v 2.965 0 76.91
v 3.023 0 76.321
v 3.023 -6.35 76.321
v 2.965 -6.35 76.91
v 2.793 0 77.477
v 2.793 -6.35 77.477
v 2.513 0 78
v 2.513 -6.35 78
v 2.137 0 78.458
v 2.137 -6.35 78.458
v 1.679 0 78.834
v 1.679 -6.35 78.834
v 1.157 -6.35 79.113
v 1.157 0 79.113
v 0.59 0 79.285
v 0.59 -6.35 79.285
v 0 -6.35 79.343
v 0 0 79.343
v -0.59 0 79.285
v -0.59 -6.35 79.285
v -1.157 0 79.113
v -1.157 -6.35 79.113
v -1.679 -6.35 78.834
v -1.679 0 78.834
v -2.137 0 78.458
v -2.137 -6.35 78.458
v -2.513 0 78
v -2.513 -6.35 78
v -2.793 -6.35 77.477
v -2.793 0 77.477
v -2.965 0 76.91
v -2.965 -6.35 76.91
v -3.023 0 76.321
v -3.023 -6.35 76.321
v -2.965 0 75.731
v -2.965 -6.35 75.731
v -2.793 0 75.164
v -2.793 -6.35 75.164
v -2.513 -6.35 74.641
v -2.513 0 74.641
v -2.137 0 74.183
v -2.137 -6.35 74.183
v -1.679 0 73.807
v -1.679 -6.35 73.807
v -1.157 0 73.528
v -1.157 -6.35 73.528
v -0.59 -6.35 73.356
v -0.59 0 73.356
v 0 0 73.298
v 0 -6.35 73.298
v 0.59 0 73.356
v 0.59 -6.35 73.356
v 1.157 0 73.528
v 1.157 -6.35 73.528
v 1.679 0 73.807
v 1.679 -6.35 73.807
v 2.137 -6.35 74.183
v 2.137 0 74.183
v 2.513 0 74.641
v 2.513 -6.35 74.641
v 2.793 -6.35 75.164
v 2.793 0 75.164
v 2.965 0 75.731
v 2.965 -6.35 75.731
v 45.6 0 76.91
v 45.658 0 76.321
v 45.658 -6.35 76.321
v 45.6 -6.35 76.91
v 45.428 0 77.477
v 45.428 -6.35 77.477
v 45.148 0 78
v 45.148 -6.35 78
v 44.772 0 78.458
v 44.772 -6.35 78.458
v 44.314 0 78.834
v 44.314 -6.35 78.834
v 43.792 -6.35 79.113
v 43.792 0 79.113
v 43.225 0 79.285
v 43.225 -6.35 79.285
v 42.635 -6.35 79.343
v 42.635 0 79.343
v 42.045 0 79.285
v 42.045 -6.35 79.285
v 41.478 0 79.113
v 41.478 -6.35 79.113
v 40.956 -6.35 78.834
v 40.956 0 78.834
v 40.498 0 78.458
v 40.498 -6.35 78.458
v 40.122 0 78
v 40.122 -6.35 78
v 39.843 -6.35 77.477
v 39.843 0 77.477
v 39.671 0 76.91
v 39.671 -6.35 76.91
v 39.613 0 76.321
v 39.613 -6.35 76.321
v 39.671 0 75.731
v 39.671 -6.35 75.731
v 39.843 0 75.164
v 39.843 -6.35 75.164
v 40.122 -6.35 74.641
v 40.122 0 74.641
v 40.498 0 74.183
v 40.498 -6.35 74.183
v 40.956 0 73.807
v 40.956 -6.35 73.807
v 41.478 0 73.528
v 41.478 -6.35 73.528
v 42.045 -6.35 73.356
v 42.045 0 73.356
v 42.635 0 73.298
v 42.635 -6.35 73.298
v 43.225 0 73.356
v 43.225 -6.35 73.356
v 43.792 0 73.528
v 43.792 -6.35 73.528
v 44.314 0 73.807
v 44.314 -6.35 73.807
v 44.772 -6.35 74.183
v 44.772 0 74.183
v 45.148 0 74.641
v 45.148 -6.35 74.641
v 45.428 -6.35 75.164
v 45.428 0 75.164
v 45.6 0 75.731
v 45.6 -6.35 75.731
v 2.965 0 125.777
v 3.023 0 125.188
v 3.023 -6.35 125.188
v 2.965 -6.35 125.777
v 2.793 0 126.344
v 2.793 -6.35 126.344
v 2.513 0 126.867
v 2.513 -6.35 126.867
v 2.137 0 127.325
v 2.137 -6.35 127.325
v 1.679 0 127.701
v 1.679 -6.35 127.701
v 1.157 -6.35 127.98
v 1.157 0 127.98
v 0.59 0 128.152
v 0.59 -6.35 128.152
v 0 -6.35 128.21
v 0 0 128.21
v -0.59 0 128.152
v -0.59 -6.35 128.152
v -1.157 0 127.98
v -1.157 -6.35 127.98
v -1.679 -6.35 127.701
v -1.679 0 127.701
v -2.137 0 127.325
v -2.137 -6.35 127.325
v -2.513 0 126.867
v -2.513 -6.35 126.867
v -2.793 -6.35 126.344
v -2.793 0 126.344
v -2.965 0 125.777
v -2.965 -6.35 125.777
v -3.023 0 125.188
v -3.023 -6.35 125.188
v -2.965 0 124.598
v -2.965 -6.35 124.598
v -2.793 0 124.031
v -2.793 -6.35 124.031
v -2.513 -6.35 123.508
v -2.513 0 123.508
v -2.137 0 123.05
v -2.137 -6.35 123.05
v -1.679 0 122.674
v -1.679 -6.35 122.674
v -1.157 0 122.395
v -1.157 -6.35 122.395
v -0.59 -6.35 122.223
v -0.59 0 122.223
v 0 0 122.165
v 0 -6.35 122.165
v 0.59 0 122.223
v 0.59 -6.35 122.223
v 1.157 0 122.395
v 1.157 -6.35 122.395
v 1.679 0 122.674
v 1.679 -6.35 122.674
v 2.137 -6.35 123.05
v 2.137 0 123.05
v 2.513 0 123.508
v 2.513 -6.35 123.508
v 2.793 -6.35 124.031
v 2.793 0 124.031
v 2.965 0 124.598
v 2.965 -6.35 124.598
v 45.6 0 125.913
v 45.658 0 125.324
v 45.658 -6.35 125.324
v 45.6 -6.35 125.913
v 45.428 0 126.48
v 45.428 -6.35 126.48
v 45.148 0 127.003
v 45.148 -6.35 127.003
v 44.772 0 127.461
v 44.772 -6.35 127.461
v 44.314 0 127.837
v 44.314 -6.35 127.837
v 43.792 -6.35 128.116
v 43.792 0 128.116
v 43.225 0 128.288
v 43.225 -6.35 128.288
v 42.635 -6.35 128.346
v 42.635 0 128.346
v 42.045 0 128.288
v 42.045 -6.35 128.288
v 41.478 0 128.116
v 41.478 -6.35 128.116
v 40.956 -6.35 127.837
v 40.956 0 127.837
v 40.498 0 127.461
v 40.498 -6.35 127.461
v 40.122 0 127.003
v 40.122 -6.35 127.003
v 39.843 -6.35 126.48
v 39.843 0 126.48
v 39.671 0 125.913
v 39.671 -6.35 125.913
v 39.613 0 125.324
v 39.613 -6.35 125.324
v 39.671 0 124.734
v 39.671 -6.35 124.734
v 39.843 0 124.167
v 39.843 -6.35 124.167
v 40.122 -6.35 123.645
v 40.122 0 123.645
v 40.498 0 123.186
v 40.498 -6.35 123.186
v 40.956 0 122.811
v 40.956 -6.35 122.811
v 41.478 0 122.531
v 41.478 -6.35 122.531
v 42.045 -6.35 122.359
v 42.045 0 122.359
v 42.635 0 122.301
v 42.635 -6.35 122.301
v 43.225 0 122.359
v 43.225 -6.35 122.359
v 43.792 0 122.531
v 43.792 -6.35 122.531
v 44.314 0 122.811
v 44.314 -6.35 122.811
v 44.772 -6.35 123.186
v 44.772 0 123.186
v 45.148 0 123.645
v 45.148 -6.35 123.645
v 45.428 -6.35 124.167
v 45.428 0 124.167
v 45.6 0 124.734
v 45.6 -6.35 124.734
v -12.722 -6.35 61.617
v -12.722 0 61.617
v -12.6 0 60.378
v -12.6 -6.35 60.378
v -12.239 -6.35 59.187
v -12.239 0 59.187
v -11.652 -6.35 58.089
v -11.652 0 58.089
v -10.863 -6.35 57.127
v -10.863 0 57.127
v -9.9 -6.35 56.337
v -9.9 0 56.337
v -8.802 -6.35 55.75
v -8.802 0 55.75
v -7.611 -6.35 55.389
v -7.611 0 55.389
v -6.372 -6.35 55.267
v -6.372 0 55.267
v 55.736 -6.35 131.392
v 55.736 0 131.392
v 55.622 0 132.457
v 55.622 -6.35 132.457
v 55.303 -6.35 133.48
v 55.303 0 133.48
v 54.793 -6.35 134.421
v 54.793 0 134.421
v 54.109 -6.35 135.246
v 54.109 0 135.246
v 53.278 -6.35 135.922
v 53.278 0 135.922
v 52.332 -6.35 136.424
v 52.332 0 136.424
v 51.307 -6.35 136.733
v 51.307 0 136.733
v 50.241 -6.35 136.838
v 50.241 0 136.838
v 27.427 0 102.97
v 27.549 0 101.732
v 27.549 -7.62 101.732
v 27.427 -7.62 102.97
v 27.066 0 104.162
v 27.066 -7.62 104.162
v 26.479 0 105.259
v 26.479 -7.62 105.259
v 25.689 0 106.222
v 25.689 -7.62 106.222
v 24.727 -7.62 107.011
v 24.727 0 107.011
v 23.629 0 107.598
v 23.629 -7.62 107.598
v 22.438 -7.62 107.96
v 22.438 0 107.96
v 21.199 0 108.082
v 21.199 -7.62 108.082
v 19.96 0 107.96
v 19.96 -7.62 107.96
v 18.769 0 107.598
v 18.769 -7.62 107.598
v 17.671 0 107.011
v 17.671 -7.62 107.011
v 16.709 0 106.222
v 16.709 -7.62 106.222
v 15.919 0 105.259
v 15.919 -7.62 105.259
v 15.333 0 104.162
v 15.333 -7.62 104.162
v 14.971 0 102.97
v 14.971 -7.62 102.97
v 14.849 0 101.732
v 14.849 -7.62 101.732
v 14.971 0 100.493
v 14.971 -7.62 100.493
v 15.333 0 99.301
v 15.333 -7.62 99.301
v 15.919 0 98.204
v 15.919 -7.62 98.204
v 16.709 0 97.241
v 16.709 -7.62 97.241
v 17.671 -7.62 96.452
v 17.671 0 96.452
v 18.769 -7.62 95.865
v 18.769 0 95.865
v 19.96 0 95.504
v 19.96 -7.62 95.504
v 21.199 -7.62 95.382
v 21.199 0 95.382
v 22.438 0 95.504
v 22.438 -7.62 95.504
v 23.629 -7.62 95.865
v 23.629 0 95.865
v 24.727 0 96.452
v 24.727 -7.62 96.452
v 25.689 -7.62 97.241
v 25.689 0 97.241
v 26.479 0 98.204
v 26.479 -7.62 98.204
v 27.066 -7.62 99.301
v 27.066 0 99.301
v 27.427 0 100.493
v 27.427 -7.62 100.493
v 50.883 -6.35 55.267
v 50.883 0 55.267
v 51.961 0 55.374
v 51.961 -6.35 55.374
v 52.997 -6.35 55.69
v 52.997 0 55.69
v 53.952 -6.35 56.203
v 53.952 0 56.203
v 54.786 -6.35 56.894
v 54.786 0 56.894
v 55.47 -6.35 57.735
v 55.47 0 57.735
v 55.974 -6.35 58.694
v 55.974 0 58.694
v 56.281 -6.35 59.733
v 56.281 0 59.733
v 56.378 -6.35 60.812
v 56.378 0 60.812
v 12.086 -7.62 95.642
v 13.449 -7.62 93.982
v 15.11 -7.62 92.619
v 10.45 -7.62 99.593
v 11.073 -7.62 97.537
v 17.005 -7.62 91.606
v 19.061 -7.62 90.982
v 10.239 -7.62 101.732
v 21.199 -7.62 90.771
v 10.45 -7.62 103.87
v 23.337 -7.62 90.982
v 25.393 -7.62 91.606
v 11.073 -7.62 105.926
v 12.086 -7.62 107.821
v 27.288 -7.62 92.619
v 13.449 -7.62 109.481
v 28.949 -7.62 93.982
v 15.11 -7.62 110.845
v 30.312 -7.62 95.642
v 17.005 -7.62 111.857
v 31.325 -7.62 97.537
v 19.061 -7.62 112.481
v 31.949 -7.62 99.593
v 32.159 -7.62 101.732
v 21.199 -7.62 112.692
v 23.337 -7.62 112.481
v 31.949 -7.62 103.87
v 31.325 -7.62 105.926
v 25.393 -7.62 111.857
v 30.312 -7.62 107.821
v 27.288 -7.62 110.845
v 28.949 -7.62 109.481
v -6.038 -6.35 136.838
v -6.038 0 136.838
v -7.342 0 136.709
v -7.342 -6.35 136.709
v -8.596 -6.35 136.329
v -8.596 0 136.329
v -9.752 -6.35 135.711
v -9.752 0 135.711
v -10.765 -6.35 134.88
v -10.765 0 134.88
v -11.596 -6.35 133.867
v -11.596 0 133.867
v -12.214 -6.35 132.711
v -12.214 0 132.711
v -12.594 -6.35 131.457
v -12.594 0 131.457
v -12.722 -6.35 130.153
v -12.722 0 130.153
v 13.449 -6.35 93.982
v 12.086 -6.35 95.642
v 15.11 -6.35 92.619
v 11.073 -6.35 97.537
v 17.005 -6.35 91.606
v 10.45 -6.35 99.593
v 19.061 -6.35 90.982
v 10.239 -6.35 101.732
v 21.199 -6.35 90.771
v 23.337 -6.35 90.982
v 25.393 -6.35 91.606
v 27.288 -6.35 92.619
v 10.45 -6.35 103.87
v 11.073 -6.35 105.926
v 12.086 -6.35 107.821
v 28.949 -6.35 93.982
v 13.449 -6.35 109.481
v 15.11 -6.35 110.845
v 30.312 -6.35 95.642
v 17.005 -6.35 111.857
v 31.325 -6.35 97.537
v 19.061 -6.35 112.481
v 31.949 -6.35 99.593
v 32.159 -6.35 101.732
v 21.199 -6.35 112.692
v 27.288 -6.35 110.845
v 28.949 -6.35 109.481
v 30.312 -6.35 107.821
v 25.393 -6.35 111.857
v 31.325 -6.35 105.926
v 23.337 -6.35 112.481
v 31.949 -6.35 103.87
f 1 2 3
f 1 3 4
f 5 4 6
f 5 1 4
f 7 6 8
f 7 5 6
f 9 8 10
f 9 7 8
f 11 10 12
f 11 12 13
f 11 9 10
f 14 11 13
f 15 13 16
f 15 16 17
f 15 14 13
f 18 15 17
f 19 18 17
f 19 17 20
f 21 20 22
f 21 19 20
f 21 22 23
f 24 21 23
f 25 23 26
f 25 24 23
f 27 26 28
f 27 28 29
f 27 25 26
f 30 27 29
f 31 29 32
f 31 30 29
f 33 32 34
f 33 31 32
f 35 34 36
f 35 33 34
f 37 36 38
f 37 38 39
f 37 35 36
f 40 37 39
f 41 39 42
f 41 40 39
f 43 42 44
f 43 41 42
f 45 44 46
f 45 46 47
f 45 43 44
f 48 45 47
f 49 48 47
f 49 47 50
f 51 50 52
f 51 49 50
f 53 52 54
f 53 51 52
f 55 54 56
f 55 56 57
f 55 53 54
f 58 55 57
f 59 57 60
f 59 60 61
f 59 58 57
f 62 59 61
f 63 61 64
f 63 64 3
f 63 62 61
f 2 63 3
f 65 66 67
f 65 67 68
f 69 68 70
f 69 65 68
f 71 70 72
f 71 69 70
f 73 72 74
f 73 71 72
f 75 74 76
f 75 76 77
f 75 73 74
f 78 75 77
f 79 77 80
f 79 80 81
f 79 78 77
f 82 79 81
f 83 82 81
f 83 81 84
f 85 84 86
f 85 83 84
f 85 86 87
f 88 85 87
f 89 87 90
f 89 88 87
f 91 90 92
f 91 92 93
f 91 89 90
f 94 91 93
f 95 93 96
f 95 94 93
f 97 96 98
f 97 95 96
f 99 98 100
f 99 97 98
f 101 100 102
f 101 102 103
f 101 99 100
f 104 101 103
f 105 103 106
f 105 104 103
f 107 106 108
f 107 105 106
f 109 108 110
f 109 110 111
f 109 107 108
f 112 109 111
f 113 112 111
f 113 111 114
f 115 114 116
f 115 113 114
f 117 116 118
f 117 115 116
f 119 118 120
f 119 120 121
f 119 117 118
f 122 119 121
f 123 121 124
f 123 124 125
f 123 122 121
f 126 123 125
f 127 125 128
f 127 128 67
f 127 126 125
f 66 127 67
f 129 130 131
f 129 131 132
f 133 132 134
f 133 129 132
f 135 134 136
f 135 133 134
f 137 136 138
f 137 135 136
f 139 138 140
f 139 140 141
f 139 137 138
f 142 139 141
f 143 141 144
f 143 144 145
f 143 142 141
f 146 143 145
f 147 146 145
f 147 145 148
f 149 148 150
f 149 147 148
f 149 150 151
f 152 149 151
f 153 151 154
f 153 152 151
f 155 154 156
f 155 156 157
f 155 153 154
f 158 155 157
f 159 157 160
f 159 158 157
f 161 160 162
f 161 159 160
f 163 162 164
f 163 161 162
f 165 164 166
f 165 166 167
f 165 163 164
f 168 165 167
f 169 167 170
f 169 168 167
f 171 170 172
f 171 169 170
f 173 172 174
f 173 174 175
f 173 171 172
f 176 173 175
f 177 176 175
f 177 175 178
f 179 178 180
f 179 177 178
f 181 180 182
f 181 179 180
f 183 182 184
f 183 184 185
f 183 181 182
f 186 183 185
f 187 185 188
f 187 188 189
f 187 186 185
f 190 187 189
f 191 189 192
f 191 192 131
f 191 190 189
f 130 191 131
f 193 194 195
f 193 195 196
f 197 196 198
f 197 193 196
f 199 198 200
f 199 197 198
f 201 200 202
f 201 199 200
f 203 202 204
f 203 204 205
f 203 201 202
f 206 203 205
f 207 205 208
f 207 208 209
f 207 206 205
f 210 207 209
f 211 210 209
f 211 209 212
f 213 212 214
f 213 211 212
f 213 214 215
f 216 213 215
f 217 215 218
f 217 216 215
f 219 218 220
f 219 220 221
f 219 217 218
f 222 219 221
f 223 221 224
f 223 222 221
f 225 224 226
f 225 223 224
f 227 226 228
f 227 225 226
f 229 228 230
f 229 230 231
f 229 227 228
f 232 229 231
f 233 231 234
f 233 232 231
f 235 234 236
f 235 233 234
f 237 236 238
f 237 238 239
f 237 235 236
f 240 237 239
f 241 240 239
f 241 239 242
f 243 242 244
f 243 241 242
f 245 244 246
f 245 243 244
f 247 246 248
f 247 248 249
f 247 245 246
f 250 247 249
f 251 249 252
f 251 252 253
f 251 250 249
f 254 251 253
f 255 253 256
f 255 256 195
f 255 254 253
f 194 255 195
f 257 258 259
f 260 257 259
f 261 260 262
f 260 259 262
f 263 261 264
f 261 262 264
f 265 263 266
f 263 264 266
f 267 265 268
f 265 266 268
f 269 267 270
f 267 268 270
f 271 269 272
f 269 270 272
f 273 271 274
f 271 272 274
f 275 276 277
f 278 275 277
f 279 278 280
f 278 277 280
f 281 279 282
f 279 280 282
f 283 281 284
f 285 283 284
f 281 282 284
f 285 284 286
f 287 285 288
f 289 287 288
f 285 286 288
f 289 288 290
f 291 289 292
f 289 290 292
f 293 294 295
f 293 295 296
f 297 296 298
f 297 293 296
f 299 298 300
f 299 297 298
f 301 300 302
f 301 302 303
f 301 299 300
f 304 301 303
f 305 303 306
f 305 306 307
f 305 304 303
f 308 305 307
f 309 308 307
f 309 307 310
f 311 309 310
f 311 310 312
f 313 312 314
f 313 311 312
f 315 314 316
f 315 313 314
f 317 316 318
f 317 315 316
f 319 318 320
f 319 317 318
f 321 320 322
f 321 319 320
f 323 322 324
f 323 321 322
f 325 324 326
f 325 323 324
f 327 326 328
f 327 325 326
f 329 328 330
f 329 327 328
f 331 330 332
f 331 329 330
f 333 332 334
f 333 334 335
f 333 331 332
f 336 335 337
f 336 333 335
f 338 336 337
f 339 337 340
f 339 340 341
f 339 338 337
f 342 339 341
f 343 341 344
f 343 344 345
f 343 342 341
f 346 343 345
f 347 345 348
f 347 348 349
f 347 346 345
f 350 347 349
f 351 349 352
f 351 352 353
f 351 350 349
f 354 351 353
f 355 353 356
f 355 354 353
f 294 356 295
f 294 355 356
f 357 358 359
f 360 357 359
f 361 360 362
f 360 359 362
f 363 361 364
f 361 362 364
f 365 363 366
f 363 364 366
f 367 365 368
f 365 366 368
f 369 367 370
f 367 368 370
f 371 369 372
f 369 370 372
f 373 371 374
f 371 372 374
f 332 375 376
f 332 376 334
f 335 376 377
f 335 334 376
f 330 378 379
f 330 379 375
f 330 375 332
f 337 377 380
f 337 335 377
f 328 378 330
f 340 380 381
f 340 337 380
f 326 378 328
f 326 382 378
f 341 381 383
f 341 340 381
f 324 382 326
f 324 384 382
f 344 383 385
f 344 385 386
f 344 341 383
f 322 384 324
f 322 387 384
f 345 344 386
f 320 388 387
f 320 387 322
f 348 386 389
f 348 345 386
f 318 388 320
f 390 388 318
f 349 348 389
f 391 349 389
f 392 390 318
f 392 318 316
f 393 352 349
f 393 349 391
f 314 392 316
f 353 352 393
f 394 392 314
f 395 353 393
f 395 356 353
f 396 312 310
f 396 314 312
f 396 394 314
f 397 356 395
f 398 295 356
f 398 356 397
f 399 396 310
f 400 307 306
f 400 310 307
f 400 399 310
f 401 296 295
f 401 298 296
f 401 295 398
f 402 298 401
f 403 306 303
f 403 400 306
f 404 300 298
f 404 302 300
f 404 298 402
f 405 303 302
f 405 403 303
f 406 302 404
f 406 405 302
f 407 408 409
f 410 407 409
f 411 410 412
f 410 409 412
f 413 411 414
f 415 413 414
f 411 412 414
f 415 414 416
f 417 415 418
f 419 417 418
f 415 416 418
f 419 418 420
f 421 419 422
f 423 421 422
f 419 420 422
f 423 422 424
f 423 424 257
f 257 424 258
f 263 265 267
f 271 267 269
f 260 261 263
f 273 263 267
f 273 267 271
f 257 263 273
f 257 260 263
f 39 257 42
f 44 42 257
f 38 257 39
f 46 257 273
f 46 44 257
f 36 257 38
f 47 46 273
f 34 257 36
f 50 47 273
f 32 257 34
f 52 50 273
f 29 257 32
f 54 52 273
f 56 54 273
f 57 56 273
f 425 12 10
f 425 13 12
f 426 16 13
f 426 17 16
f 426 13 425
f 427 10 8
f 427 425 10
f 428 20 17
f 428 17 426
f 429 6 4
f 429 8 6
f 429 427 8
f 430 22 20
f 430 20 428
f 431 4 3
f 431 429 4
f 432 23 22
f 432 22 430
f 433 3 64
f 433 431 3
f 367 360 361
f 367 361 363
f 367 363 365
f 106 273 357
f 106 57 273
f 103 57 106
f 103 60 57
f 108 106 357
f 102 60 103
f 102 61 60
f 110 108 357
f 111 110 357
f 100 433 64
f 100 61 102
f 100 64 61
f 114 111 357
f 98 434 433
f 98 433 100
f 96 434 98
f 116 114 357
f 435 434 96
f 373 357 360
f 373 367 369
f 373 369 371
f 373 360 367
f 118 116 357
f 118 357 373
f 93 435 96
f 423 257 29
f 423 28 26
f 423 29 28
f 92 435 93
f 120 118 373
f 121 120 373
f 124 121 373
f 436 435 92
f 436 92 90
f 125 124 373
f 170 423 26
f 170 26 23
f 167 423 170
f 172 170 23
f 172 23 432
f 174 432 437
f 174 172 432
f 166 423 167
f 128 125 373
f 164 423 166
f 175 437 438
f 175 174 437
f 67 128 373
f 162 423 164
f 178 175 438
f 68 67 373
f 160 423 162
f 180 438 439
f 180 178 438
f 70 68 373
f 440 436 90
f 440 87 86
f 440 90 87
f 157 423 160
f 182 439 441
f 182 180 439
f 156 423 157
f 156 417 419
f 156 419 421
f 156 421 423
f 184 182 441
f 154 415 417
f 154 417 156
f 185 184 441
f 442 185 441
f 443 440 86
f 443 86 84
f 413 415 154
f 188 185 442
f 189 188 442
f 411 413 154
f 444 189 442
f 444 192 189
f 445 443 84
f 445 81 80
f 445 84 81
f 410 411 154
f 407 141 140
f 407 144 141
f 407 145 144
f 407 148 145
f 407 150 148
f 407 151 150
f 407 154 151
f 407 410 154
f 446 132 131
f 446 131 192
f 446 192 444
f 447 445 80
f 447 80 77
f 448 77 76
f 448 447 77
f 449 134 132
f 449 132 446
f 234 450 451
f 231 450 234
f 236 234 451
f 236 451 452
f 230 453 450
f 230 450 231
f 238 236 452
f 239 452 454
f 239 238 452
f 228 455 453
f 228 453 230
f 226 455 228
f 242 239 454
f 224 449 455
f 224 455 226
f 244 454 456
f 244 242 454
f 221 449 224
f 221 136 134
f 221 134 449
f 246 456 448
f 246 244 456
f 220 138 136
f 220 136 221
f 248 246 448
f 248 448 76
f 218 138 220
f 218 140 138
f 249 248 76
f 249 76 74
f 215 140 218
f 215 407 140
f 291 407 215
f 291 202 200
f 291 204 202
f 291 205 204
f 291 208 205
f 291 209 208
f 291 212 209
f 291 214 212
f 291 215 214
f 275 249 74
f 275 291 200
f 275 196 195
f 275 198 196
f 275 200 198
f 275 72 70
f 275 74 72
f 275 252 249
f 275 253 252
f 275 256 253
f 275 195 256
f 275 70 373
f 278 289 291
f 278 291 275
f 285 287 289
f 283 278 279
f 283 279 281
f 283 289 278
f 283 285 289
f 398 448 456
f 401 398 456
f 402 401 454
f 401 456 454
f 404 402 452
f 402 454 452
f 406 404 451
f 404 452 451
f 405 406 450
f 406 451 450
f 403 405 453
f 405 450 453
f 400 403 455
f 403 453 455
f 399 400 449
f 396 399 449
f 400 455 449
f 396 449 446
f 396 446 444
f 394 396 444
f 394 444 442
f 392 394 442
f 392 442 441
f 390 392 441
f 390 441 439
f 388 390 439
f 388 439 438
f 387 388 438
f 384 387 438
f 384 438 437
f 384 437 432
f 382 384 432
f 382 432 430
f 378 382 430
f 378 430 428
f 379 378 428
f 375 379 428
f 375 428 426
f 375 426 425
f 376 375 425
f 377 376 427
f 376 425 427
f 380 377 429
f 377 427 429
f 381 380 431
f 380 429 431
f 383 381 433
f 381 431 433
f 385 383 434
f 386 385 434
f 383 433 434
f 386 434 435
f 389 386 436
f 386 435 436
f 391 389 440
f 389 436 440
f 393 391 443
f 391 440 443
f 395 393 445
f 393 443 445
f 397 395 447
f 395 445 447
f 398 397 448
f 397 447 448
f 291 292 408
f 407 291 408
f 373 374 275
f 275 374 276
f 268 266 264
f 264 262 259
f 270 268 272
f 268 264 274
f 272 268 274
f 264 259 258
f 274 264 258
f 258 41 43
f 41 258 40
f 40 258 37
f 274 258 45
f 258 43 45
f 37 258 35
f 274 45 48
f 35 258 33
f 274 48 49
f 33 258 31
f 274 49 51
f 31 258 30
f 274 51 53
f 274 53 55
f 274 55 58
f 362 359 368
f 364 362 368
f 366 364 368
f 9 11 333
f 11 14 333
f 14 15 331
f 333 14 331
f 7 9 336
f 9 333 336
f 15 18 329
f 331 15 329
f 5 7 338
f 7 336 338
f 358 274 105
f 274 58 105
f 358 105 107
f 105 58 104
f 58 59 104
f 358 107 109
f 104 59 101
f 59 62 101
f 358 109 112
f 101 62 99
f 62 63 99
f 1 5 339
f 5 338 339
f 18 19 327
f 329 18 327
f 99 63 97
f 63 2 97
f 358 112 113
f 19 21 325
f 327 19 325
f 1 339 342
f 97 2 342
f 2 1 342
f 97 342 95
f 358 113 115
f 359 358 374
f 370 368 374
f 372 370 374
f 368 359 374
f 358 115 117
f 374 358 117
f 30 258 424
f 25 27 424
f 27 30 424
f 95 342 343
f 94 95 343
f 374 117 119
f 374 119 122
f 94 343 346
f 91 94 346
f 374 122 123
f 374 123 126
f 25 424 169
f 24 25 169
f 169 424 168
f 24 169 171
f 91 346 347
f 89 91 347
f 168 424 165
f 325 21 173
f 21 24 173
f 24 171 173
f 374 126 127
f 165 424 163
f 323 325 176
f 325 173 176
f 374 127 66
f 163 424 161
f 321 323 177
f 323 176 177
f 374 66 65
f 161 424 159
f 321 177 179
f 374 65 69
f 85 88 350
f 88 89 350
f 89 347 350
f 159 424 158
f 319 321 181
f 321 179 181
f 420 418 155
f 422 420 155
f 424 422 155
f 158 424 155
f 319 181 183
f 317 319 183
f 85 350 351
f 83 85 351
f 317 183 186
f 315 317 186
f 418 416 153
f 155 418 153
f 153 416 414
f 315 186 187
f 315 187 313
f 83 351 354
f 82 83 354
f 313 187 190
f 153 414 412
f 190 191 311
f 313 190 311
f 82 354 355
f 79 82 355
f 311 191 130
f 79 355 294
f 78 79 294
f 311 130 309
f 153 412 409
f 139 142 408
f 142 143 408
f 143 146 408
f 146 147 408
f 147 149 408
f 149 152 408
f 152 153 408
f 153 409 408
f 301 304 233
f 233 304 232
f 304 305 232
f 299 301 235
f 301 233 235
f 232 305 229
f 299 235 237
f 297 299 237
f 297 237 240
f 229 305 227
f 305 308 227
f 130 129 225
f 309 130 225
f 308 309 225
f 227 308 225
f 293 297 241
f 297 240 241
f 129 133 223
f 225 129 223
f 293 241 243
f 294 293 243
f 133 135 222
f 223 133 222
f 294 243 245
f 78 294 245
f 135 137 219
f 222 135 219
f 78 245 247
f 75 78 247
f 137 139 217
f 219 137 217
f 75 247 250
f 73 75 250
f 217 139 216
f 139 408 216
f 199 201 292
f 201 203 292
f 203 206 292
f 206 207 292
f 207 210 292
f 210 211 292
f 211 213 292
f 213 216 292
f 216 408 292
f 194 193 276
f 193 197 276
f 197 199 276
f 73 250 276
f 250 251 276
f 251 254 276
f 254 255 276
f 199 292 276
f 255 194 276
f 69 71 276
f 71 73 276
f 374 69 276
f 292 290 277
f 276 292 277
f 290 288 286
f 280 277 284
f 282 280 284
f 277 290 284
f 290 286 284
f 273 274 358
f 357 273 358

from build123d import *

# Parameters (mm, degrees)
F0_R     = 3.022598
F0_R_2   = 10.9601
F1_DEPTH = 6.35
F0_R_3   = 6.35
F2_DEPTH = 7.62


with BuildPart() as f1:
    # F0 (on Front) → F1 (new body)
    with BuildSketch(Plane.XZ):
        with BuildLine():
            Line((-6.372447, 55.266804), (50.882847, 55.266804))
            ThreePointArc((50.882847, 55.266804), (54.786488, 56.894159), (56.378253, 60.812448))
            Line((56.378253, 60.812448), (55.73595, 131.391965))
            ThreePointArc((55.73595, 131.391965), (54.108822, 135.245595), (50.240544, 136.837588))
            Line((50.240544, 136.837588), (-6.038059, 136.837588))
            ThreePointArc((-6.038059, 136.837588), (-10.764635, 134.879776), (-12.722447, 130.1532))
            Line((-12.722447, 130.1532), (-12.722447, 61.616804))
            ThreePointArc((-12.722447, 61.616804), (-10.862575, 57.126676), (-6.372447, 55.266804))
        make_face()
        with Locations((0, 76.320676)):
            Circle(F0_R, mode=Mode.SUBTRACT)
        with Locations((42.635123, 76.320676)):
            Circle(F0_R, mode=Mode.SUBTRACT)
        with Locations((21.199137, 101.73152)):
            Circle(F0_R_2, mode=Mode.SUBTRACT)
        with Locations((0, 125.187695)):
            Circle(F0_R, mode=Mode.SUBTRACT)
        with Locations((42.635123, 125.323778)):
            Circle(F0_R, mode=Mode.SUBTRACT)
    extrude(amount=F1_DEPTH)

    # F0 (on Front) → F2 (join)
    with BuildSketch(Plane.XZ):
        with Locations((21.199137, 101.73152)):
            Circle(F0_R_2)
        with Locations((21.199137, 101.73152)):
            Circle(F0_R_3, mode=Mode.SUBTRACT)
    extrude(amount=F2_DEPTH)


solid = f1.part
